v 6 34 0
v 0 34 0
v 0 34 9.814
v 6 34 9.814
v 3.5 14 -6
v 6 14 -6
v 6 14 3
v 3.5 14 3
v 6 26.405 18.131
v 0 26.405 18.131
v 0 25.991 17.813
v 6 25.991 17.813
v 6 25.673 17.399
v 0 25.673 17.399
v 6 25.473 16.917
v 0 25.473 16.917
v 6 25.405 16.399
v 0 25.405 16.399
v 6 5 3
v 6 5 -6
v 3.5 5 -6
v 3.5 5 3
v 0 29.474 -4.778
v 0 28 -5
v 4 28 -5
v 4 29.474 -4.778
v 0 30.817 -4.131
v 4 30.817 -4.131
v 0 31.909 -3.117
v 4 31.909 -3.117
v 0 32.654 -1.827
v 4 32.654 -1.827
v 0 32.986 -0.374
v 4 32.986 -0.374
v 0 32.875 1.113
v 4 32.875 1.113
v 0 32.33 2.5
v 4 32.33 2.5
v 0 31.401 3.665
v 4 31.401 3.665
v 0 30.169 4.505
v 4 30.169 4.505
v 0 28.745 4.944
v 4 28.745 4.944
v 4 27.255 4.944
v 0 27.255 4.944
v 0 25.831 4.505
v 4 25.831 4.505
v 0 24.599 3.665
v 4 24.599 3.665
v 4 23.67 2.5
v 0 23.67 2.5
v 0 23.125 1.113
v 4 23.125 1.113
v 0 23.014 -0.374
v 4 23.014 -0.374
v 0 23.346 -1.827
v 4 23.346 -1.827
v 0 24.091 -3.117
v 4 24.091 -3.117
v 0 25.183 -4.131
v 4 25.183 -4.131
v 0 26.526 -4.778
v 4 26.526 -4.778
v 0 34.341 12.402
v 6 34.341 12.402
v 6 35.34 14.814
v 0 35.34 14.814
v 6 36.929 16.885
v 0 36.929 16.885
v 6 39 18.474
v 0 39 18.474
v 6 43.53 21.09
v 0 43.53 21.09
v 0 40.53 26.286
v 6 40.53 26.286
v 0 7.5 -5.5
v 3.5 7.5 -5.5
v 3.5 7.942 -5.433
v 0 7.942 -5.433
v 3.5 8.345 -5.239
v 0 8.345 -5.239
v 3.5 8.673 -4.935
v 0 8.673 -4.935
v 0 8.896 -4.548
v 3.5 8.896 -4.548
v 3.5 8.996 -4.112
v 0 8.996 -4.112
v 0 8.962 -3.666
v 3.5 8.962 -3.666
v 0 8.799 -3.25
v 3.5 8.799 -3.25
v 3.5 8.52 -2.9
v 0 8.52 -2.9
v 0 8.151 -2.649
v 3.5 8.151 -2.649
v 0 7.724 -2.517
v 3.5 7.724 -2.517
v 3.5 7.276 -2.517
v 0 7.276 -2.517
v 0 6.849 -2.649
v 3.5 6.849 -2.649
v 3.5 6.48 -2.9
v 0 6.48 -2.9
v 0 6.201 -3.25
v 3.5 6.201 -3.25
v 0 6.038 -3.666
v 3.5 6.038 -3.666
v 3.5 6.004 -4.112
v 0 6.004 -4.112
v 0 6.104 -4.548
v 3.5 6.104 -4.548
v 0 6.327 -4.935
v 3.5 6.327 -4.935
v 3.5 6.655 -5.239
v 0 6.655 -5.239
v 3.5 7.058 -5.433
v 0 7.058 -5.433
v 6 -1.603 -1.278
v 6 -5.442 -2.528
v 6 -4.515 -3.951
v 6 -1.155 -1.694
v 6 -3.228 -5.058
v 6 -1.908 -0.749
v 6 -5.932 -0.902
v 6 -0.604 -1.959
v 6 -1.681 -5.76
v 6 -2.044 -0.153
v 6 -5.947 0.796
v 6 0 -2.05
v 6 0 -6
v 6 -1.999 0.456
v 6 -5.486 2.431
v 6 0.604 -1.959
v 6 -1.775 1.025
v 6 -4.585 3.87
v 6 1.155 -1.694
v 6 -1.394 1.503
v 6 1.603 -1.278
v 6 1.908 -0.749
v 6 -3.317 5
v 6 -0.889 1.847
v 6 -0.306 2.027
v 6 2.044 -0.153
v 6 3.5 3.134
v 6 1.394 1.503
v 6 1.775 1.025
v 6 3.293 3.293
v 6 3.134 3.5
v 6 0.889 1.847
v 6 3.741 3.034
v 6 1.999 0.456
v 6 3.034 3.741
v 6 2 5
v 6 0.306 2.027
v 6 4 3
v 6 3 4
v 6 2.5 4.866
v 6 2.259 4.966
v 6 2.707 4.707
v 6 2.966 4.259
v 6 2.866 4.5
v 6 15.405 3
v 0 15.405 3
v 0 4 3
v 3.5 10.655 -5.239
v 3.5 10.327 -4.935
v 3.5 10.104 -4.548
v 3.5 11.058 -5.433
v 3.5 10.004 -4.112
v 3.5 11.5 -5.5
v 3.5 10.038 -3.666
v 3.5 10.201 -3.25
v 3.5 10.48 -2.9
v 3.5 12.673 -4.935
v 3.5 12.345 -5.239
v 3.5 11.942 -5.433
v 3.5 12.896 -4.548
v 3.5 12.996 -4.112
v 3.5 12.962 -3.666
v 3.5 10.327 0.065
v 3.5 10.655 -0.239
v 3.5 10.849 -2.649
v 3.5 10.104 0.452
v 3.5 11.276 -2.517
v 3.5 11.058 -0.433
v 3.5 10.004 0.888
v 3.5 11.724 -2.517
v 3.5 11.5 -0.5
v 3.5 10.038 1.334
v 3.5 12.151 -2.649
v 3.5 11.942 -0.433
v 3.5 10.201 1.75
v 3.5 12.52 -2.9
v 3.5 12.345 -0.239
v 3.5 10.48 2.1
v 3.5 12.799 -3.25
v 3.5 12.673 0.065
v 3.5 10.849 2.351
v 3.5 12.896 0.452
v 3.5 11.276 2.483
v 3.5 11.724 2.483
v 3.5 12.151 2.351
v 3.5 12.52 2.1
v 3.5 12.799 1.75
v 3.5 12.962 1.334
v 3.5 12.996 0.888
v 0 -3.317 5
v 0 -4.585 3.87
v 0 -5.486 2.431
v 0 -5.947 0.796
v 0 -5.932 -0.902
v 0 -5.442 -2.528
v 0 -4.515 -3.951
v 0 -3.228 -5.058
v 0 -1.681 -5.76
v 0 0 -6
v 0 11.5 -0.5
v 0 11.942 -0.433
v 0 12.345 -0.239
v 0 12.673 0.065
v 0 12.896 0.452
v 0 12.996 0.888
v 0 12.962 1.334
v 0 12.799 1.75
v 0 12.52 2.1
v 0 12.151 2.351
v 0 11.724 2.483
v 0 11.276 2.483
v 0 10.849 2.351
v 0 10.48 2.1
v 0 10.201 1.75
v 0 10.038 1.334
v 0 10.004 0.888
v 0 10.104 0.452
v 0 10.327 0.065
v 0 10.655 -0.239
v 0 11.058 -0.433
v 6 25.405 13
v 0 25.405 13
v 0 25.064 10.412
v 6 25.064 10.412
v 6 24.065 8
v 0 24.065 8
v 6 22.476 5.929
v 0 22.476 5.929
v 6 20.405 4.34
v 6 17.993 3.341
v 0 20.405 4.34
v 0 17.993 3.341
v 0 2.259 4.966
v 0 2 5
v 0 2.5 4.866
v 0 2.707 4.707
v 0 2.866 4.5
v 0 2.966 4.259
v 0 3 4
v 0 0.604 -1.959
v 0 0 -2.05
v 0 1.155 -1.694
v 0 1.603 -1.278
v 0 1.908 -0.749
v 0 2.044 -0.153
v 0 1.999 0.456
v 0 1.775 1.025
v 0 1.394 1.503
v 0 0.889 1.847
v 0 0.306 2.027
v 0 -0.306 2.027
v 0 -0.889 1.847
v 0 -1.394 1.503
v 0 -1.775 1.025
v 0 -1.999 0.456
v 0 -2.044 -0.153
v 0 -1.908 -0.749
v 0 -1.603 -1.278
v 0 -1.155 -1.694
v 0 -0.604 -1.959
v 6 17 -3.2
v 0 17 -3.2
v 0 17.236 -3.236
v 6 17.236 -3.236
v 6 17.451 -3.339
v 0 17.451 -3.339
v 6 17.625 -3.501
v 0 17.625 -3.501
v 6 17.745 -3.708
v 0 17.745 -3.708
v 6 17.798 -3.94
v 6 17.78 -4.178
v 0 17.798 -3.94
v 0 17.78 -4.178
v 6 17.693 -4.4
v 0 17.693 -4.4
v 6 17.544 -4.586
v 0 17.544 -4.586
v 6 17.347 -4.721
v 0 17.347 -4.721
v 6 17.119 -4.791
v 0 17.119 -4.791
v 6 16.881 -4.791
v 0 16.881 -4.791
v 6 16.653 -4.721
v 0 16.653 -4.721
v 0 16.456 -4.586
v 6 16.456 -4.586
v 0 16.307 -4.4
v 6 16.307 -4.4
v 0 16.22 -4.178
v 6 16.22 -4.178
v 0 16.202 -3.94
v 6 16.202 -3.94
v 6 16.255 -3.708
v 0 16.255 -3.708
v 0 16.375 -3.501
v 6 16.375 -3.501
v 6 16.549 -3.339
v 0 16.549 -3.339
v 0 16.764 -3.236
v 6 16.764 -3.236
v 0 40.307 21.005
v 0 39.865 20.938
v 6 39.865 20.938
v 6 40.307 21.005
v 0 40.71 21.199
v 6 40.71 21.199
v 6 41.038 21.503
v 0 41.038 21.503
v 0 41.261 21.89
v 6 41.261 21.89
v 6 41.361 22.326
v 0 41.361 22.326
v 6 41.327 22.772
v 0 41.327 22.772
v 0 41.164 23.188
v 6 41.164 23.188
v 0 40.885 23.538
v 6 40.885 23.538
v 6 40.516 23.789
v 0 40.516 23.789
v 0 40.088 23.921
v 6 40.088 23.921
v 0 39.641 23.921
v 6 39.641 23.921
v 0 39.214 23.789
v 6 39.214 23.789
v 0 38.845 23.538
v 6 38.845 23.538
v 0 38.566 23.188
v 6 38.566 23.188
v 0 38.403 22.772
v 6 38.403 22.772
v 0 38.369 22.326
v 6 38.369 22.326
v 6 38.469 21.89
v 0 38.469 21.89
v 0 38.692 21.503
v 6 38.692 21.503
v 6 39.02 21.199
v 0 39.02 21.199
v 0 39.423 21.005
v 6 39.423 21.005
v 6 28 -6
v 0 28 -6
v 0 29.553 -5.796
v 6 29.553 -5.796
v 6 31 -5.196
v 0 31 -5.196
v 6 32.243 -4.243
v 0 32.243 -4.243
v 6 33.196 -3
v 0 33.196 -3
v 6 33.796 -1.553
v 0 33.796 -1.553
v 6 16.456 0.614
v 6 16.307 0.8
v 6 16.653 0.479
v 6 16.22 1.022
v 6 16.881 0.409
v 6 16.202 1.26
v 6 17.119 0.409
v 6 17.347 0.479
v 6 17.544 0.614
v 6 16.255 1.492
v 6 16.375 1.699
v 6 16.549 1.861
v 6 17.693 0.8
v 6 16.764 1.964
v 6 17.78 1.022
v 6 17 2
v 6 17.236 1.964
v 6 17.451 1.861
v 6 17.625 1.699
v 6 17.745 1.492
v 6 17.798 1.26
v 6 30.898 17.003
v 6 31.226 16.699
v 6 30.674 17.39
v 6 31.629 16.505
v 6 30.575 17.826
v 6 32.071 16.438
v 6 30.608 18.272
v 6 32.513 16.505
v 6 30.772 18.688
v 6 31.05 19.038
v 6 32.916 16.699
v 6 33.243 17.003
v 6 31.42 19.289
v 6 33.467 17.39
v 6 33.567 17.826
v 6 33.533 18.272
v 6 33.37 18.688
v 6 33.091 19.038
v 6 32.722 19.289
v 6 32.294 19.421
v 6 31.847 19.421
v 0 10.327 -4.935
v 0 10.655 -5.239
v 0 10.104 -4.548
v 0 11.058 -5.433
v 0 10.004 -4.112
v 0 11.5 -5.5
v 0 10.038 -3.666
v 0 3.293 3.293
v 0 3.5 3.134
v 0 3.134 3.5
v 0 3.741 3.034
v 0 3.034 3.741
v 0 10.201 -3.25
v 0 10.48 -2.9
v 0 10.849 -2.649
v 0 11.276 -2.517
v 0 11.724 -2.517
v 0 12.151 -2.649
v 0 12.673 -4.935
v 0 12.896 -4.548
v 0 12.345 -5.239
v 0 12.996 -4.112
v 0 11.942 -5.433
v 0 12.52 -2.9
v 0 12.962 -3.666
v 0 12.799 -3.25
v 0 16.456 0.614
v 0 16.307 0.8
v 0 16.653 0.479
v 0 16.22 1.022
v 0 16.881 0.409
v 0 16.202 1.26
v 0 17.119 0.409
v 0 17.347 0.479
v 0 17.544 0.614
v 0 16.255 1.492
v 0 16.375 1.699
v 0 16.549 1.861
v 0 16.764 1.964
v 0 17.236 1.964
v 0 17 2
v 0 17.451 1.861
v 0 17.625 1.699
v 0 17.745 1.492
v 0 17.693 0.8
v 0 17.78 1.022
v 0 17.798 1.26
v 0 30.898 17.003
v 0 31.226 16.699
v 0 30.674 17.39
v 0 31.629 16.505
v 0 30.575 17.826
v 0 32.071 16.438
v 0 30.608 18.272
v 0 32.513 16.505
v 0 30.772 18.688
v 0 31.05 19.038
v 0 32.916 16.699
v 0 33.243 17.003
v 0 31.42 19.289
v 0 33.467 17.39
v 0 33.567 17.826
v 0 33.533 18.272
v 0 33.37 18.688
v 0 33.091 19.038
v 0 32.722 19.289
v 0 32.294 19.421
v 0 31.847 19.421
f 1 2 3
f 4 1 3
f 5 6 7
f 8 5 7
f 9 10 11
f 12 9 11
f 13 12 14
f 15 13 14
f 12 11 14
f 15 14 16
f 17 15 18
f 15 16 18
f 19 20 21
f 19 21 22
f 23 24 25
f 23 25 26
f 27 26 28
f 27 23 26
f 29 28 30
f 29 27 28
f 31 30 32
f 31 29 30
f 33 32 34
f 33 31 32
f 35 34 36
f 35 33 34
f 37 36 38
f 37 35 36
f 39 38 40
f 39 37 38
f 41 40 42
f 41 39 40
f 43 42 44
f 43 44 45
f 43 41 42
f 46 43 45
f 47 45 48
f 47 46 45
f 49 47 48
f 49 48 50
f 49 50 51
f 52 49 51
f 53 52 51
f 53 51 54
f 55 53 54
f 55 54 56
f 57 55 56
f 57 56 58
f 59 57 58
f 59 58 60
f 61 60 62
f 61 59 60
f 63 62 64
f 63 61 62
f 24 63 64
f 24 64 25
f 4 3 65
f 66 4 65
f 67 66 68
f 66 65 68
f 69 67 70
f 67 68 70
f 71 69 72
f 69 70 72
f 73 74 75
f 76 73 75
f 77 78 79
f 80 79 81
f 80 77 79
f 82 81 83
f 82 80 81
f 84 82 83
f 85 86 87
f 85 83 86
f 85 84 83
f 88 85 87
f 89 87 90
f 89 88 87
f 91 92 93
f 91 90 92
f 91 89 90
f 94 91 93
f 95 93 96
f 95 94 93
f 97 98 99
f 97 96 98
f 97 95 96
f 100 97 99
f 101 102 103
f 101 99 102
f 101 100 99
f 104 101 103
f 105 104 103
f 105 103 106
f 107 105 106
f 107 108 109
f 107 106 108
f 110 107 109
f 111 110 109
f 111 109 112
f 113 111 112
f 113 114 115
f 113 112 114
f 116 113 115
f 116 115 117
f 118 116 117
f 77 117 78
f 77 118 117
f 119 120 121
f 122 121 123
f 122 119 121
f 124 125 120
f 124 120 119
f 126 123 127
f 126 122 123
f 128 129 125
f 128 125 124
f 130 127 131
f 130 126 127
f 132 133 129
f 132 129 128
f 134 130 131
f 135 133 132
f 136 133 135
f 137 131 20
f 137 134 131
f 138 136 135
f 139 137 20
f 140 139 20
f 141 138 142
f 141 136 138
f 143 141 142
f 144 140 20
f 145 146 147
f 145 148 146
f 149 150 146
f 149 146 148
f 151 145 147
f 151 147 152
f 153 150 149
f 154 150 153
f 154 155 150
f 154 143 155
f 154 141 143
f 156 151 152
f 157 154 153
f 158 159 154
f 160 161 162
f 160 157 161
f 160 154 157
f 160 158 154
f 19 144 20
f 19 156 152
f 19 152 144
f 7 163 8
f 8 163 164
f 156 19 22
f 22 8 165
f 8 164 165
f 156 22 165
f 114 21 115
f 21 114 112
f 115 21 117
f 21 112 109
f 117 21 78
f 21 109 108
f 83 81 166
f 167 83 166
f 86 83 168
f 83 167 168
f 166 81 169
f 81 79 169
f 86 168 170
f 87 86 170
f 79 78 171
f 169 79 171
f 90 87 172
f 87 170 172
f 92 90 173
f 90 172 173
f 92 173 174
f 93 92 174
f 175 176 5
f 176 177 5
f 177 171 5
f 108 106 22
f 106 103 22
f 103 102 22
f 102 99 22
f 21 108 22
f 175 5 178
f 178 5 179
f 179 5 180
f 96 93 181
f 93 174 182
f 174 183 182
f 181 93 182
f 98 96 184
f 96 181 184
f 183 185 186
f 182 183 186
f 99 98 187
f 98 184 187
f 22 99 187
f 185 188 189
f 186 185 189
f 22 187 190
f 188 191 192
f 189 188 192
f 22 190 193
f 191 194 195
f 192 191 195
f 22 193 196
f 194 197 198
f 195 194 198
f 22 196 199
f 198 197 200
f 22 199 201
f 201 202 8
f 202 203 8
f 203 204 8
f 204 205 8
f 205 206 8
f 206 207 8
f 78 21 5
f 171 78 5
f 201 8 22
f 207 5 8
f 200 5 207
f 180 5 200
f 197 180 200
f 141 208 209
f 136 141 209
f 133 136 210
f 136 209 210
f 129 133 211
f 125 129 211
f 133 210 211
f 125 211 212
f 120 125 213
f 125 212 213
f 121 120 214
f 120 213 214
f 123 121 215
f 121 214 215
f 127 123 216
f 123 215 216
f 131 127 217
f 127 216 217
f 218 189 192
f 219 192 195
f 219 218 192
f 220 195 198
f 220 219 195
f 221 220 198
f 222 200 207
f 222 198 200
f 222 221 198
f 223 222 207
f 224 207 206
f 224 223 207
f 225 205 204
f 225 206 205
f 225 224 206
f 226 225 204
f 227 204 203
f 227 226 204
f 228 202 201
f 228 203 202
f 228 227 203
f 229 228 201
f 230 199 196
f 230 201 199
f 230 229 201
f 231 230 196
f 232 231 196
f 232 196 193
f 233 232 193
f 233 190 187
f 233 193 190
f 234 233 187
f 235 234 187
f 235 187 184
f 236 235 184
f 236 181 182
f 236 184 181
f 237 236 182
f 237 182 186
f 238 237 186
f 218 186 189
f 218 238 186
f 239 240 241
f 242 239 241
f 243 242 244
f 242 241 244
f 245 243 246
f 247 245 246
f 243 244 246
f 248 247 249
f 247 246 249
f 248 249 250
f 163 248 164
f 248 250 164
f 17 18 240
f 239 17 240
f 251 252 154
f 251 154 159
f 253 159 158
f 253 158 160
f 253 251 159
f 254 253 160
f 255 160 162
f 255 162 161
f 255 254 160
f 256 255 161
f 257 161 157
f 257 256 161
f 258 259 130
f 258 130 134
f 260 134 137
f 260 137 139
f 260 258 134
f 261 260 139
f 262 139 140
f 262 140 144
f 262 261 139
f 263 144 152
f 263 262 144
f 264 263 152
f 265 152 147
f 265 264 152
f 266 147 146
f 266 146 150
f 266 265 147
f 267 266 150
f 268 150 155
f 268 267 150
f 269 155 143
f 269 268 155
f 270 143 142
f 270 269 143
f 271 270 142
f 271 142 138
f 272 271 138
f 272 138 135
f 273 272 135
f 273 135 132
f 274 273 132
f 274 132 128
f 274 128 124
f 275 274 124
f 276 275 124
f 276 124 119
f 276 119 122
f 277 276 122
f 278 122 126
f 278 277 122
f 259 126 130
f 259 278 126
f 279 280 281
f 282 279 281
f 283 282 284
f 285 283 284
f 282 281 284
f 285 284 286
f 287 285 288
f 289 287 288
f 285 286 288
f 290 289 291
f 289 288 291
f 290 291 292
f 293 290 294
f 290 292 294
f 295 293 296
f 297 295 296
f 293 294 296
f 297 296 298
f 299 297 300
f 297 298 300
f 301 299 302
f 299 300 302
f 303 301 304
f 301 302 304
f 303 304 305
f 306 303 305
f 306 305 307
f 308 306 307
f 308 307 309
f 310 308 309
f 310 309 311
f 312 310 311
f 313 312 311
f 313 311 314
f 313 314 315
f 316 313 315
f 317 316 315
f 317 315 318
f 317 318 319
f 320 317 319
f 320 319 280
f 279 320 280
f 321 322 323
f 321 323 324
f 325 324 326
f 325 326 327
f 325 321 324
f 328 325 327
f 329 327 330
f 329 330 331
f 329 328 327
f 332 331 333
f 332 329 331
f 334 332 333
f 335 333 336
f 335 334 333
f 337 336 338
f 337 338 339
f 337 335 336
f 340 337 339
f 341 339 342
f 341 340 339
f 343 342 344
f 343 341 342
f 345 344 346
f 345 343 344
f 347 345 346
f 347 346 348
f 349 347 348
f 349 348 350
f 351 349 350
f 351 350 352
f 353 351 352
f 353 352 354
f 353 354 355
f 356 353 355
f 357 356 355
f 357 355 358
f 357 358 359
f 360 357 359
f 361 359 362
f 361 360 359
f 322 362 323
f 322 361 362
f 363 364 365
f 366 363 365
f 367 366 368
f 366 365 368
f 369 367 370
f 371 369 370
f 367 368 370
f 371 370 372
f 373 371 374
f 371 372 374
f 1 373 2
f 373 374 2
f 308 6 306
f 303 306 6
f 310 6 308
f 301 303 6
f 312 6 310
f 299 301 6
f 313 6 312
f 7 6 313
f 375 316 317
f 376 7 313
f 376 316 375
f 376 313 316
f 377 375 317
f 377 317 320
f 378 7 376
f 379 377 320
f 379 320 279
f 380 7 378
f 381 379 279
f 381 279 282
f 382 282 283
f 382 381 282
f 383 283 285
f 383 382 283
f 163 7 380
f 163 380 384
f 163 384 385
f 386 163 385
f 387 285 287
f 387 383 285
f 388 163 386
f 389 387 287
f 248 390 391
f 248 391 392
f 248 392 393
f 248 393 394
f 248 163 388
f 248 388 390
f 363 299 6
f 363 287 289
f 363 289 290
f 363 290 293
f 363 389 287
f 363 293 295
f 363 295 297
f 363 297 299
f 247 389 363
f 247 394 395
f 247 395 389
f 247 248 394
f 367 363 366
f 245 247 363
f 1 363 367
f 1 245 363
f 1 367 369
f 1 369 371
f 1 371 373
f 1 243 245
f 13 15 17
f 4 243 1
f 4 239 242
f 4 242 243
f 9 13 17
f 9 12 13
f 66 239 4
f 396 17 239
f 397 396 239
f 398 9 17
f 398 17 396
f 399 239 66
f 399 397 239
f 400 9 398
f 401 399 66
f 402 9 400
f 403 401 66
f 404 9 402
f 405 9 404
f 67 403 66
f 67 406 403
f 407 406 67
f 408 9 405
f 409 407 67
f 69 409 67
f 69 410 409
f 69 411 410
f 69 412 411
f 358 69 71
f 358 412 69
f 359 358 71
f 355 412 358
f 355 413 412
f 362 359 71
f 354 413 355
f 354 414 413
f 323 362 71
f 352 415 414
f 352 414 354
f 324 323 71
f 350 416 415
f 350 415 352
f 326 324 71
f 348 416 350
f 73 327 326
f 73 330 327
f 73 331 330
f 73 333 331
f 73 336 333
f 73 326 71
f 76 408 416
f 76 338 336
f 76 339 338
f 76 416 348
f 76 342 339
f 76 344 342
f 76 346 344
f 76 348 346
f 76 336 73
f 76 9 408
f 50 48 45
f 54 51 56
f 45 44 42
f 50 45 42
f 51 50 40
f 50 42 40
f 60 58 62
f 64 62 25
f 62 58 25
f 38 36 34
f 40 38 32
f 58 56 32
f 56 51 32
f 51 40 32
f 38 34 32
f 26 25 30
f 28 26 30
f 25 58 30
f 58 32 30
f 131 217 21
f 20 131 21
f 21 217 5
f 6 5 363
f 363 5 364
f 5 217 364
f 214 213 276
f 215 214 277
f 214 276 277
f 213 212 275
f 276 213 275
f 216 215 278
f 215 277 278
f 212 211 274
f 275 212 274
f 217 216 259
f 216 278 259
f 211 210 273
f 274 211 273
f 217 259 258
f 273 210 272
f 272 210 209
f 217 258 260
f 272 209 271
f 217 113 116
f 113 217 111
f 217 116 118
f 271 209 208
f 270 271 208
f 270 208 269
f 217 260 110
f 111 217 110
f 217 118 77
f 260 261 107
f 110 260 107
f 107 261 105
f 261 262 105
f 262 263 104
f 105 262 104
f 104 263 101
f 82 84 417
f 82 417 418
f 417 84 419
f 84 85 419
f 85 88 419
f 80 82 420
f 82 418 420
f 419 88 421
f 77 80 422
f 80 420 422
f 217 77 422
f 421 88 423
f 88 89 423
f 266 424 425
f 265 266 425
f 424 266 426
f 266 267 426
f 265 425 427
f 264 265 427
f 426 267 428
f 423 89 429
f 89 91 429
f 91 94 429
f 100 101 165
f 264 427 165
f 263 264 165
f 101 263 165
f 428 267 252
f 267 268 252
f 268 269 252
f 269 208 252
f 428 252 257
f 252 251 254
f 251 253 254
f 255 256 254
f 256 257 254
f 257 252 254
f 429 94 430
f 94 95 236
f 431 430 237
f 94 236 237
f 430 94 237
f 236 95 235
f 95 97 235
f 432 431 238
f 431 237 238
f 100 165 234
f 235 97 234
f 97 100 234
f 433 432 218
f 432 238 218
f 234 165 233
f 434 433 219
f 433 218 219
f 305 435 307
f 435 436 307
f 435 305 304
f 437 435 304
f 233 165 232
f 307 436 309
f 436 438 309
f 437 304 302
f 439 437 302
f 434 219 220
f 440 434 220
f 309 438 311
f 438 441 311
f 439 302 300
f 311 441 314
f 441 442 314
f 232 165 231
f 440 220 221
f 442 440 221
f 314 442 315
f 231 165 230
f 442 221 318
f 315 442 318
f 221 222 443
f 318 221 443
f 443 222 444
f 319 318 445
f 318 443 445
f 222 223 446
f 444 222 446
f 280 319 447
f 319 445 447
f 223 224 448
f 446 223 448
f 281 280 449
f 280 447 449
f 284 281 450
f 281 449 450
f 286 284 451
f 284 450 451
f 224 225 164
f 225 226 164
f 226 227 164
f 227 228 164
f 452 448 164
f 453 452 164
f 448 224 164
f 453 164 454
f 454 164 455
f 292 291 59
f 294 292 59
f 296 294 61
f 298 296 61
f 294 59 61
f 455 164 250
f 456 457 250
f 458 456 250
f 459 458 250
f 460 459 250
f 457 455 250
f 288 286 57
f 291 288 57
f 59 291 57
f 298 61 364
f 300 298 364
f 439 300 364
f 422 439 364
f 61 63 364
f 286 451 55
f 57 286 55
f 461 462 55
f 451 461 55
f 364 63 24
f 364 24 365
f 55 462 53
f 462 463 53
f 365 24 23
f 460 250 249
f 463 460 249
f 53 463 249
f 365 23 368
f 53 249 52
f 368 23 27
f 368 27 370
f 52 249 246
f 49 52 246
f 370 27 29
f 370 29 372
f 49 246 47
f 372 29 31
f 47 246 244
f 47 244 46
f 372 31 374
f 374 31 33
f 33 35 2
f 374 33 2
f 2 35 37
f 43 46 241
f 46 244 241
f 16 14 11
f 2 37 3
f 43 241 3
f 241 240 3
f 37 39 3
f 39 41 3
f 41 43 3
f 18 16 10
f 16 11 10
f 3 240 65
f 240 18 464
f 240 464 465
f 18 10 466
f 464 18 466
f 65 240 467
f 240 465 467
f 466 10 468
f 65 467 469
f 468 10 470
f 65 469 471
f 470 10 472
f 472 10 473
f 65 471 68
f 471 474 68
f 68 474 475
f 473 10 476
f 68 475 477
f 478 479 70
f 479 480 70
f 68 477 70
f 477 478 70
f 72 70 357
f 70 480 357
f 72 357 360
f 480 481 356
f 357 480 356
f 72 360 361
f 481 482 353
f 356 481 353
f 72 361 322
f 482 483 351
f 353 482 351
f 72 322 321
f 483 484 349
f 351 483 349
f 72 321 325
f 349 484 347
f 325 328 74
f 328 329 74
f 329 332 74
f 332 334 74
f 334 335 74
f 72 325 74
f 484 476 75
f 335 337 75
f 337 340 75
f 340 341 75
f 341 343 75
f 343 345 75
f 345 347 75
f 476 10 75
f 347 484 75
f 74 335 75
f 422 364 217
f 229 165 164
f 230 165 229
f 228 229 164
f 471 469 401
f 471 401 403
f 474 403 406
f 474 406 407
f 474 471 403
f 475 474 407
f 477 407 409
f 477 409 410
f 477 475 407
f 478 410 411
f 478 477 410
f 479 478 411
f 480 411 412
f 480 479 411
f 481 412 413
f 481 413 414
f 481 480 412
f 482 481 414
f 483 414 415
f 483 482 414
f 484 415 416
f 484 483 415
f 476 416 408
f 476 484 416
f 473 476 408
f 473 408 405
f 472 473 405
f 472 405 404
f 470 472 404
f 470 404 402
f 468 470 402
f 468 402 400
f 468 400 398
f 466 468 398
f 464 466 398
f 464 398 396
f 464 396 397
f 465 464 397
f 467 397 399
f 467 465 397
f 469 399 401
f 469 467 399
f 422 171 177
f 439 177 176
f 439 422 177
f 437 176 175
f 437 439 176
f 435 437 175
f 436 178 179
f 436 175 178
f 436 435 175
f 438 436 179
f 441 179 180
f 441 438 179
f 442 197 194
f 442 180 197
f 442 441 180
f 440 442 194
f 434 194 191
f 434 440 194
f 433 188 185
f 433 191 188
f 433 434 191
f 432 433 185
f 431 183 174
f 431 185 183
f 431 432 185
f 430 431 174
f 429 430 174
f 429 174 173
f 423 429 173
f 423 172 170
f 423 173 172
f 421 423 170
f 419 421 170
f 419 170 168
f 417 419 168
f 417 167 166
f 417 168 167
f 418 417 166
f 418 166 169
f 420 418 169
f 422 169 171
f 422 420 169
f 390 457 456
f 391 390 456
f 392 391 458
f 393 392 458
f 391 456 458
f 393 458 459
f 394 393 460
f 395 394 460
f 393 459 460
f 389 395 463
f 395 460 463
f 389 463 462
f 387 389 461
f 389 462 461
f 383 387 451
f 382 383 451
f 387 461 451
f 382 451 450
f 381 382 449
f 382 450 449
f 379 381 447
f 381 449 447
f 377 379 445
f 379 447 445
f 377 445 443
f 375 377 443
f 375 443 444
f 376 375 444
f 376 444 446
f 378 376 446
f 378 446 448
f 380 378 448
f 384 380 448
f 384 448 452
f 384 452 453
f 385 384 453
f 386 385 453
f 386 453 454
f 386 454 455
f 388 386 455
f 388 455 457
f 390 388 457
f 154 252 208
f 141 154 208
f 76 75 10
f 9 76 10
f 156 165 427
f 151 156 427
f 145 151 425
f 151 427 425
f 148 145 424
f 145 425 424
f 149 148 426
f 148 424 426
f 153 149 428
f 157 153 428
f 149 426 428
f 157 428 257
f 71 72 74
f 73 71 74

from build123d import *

# Parameters (mm, degrees)
SKETCH1_R                   = 2.05
SKETCH1_R_2                 = 1.5
BOSS_EXTRUDE1_DEPTH         = 6
FILLET1_START               = -1
FILLET1_DEPTH               = 8
FILLET1_2_DEPTH             = 6
TAP_DRILL_FOR_M2X0_4_TAP1_D = 1.6
SKETCH4_W                   = 9
SKETCH4_H                   = 9
CUT_EXTRUDE1_DEPTH          = 2.5
SKETCH5_R                   = 5
CUT_EXTRUDE2_DEPTH          = 4


with BuildPart() as part:
    # Sketch1 → Boss-Extrude1 (new body)
    with BuildSketch(Plane(origin=(0, 0, 0), x_dir=(0, 0, -1), z_dir=(1, 0, 0))):
        with BuildLine():
            Line((6, 0), (6, 28))
            ThreePointArc((6, 28), (4.242640687, 32.242640687), (0, 34))
            Line((0, 34), (-9.814222224, 34))
            ThreePointArc((-9.814222224, 34), (-14.814222224, 35.339745962), (-18.474476262, 39))
            Line((-18.474476262, 39), (-21.089872981, 43.53))
            Line((-21.089872981, 43.53), (-26.286025404, 40.53))
            Line((-26.286025404, 40.53), (-18.131025404, 26.405125664))
            ThreePointArc((-18.131025404, 26.405125664), (-17.398974596, 25.673074857), (-16.398974596, 25.405125664))
            Line((-16.398974596, 25.405125664), (-13, 25.405125664))
            ThreePointArc((-13, 25.405125664), (-5.928932188, 22.476193476), (-3, 15.405125664))
            Line((-3, 15.405125664), (-3, 3))
            Line((-3, 3), (-5, 3))
            Line((-5, 3), (-5, -3.31662479))
            ThreePointArc((-5, -3.31662479), (1.732050808, -5.744562647), (6, 0))
        make_face()
        Circle(SKETCH1_R, mode=Mode.SUBTRACT)
        with Locations((-22.437949192, 39.864936491)):
            Circle(SKETCH1_R_2, mode=Mode.SUBTRACT)
        with Locations((-17.937949192, 32.070707856)):
            Circle(SKETCH1_R_2, mode=Mode.SUBTRACT)
        with Locations((-1, 11.5)):
            Circle(SKETCH1_R_2, mode=Mode.SUBTRACT)
        with Locations((4, 11.5)):
            Circle(SKETCH1_R_2, mode=Mode.SUBTRACT)
        with Locations((4, 7.5)):
            Circle(SKETCH1_R_2, mode=Mode.SUBTRACT)
    extrude(amount=BOSS_EXTRUDE1_DEPTH)

    # Fillet1: read off the stored shape, not the designer's step
    # Fillet1 outline → Fillet1 (cut)
    with BuildSketch(Plane.YZ.offset(FILLET1_START)):
        with BuildLine():
            ThreePointArc((2, 5), (2.707106781, 4.707106781), (3, 4))
            Line((3, 4), (3, 5))
            Line((3, 5), (2, 5))
        make_face()
    extrude(amount=FILLET1_DEPTH, mode=Mode.SUBTRACT)

    # Fillet1 2 outline → Fillet1 2 (add)
    with BuildSketch(Plane.YZ):
        with BuildLine():
            ThreePointArc((4, 3), (3.292893219, 3.292893219), (3, 4))
            Line((3, 4), (3, 3))
            Line((3, 3), (4, 3))
        make_face()
    extrude(amount=FILLET1_2_DEPTH)

    # Tap Drill for M2x0.4 Tap1 (through all)
    with Locations(Plane(origin=(6, 0, 0), x_dir=(0, 0, -1), z_dir=(1, 0, 0))):
        with Locations((-1.2, 17), (4, 17)):
            Hole(TAP_DRILL_FOR_M2X0_4_TAP1_D / 2)

    # Sketch4 → Cut-Extrude1 (cut)
    with BuildSketch(Plane.ZY.offset(-6)):
        with Locations((-1.5, 9.5)):
            Rectangle(SKETCH4_W, SKETCH4_H)
    extrude(amount=CUT_EXTRUDE1_DEPTH, mode=Mode.SUBTRACT)

    # Sketch5 → Cut-Extrude2 (cut)
    with BuildSketch(Plane(origin=(0, 0, 0), x_dir=(0, 0, -1), z_dir=(1, 0, 0))):
        with Locations((0, 28)):
            Circle(SKETCH5_R)
    extrude(amount=CUT_EXTRUDE2_DEPTH, mode=Mode.SUBTRACT)


solid = part.part
